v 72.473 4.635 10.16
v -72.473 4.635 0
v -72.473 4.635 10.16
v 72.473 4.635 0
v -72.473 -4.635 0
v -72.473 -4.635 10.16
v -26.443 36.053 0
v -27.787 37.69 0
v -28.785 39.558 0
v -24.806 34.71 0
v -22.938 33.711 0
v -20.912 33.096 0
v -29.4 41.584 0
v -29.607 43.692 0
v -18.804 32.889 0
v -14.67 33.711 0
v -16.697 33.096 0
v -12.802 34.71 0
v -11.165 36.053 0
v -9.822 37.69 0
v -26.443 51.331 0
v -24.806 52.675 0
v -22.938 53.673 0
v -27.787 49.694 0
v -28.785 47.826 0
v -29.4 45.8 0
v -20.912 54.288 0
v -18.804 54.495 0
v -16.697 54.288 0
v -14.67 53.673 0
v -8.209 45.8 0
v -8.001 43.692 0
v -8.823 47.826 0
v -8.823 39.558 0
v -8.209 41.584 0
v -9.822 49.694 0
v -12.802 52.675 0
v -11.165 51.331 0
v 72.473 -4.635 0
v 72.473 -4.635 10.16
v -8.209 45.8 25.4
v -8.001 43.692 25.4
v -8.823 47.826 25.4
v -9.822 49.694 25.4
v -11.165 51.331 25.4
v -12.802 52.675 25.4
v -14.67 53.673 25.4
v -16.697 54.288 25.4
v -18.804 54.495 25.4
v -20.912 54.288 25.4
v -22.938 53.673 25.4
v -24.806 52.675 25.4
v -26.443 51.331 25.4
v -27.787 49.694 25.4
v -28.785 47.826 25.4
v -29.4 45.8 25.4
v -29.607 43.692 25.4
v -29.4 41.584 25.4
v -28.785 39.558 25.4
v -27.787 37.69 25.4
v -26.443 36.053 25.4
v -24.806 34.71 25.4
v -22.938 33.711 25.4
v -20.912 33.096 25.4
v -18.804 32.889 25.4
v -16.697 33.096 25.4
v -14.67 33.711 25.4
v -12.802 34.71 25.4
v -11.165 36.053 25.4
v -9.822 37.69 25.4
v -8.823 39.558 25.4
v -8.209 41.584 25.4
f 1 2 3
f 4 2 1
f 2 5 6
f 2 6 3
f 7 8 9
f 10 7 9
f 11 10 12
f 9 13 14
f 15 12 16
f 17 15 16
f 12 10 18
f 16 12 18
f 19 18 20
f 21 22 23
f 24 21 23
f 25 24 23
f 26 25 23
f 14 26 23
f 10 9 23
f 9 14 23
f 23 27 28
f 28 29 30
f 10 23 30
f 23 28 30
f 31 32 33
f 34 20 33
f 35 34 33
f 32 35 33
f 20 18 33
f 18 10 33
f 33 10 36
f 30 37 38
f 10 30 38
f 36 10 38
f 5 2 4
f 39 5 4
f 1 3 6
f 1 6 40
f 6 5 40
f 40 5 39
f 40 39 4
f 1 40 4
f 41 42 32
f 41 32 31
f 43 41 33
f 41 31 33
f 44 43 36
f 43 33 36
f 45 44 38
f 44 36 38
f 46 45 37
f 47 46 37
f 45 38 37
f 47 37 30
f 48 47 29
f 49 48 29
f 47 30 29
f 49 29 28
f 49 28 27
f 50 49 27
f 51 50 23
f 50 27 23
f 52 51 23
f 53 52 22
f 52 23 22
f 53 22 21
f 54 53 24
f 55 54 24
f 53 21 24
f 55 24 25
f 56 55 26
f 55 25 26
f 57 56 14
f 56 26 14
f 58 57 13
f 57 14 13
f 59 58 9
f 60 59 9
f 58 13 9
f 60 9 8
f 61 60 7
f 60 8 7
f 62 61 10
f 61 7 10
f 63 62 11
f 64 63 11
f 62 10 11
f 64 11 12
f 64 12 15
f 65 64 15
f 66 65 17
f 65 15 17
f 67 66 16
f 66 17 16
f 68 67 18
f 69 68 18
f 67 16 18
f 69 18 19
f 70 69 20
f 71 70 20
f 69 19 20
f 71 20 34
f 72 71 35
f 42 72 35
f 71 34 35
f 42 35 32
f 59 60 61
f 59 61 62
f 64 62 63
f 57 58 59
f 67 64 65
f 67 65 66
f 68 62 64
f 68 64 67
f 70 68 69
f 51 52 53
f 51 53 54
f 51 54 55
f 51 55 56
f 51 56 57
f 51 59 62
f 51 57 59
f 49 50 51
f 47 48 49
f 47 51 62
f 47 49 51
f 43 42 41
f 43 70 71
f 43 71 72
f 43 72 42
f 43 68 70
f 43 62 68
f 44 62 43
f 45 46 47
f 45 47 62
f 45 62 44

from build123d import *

# Parameters (mm, degrees)
F0_W     = 144.94598
F0_H     = 9.269802
F1_DEPTH = 10.16
F0_R     = 10.803259
F2_DEPTH = 25.4


with BuildPart() as f1:
    # F0 (on Top) → F1 (new body)
    with BuildSketch(Plane.XY):
        Rectangle(F0_W, F0_H)
    extrude(amount=F1_DEPTH)


with BuildPart() as f2:
    # F0 (on Top) → F2 (new body)
    with BuildSketch(Plane.XY):
        with Locations((-18.804194, 43.692101)):
            Circle(F0_R)
    extrude(amount=F2_DEPTH)


solid = Compound([f1.part, f2.part])
